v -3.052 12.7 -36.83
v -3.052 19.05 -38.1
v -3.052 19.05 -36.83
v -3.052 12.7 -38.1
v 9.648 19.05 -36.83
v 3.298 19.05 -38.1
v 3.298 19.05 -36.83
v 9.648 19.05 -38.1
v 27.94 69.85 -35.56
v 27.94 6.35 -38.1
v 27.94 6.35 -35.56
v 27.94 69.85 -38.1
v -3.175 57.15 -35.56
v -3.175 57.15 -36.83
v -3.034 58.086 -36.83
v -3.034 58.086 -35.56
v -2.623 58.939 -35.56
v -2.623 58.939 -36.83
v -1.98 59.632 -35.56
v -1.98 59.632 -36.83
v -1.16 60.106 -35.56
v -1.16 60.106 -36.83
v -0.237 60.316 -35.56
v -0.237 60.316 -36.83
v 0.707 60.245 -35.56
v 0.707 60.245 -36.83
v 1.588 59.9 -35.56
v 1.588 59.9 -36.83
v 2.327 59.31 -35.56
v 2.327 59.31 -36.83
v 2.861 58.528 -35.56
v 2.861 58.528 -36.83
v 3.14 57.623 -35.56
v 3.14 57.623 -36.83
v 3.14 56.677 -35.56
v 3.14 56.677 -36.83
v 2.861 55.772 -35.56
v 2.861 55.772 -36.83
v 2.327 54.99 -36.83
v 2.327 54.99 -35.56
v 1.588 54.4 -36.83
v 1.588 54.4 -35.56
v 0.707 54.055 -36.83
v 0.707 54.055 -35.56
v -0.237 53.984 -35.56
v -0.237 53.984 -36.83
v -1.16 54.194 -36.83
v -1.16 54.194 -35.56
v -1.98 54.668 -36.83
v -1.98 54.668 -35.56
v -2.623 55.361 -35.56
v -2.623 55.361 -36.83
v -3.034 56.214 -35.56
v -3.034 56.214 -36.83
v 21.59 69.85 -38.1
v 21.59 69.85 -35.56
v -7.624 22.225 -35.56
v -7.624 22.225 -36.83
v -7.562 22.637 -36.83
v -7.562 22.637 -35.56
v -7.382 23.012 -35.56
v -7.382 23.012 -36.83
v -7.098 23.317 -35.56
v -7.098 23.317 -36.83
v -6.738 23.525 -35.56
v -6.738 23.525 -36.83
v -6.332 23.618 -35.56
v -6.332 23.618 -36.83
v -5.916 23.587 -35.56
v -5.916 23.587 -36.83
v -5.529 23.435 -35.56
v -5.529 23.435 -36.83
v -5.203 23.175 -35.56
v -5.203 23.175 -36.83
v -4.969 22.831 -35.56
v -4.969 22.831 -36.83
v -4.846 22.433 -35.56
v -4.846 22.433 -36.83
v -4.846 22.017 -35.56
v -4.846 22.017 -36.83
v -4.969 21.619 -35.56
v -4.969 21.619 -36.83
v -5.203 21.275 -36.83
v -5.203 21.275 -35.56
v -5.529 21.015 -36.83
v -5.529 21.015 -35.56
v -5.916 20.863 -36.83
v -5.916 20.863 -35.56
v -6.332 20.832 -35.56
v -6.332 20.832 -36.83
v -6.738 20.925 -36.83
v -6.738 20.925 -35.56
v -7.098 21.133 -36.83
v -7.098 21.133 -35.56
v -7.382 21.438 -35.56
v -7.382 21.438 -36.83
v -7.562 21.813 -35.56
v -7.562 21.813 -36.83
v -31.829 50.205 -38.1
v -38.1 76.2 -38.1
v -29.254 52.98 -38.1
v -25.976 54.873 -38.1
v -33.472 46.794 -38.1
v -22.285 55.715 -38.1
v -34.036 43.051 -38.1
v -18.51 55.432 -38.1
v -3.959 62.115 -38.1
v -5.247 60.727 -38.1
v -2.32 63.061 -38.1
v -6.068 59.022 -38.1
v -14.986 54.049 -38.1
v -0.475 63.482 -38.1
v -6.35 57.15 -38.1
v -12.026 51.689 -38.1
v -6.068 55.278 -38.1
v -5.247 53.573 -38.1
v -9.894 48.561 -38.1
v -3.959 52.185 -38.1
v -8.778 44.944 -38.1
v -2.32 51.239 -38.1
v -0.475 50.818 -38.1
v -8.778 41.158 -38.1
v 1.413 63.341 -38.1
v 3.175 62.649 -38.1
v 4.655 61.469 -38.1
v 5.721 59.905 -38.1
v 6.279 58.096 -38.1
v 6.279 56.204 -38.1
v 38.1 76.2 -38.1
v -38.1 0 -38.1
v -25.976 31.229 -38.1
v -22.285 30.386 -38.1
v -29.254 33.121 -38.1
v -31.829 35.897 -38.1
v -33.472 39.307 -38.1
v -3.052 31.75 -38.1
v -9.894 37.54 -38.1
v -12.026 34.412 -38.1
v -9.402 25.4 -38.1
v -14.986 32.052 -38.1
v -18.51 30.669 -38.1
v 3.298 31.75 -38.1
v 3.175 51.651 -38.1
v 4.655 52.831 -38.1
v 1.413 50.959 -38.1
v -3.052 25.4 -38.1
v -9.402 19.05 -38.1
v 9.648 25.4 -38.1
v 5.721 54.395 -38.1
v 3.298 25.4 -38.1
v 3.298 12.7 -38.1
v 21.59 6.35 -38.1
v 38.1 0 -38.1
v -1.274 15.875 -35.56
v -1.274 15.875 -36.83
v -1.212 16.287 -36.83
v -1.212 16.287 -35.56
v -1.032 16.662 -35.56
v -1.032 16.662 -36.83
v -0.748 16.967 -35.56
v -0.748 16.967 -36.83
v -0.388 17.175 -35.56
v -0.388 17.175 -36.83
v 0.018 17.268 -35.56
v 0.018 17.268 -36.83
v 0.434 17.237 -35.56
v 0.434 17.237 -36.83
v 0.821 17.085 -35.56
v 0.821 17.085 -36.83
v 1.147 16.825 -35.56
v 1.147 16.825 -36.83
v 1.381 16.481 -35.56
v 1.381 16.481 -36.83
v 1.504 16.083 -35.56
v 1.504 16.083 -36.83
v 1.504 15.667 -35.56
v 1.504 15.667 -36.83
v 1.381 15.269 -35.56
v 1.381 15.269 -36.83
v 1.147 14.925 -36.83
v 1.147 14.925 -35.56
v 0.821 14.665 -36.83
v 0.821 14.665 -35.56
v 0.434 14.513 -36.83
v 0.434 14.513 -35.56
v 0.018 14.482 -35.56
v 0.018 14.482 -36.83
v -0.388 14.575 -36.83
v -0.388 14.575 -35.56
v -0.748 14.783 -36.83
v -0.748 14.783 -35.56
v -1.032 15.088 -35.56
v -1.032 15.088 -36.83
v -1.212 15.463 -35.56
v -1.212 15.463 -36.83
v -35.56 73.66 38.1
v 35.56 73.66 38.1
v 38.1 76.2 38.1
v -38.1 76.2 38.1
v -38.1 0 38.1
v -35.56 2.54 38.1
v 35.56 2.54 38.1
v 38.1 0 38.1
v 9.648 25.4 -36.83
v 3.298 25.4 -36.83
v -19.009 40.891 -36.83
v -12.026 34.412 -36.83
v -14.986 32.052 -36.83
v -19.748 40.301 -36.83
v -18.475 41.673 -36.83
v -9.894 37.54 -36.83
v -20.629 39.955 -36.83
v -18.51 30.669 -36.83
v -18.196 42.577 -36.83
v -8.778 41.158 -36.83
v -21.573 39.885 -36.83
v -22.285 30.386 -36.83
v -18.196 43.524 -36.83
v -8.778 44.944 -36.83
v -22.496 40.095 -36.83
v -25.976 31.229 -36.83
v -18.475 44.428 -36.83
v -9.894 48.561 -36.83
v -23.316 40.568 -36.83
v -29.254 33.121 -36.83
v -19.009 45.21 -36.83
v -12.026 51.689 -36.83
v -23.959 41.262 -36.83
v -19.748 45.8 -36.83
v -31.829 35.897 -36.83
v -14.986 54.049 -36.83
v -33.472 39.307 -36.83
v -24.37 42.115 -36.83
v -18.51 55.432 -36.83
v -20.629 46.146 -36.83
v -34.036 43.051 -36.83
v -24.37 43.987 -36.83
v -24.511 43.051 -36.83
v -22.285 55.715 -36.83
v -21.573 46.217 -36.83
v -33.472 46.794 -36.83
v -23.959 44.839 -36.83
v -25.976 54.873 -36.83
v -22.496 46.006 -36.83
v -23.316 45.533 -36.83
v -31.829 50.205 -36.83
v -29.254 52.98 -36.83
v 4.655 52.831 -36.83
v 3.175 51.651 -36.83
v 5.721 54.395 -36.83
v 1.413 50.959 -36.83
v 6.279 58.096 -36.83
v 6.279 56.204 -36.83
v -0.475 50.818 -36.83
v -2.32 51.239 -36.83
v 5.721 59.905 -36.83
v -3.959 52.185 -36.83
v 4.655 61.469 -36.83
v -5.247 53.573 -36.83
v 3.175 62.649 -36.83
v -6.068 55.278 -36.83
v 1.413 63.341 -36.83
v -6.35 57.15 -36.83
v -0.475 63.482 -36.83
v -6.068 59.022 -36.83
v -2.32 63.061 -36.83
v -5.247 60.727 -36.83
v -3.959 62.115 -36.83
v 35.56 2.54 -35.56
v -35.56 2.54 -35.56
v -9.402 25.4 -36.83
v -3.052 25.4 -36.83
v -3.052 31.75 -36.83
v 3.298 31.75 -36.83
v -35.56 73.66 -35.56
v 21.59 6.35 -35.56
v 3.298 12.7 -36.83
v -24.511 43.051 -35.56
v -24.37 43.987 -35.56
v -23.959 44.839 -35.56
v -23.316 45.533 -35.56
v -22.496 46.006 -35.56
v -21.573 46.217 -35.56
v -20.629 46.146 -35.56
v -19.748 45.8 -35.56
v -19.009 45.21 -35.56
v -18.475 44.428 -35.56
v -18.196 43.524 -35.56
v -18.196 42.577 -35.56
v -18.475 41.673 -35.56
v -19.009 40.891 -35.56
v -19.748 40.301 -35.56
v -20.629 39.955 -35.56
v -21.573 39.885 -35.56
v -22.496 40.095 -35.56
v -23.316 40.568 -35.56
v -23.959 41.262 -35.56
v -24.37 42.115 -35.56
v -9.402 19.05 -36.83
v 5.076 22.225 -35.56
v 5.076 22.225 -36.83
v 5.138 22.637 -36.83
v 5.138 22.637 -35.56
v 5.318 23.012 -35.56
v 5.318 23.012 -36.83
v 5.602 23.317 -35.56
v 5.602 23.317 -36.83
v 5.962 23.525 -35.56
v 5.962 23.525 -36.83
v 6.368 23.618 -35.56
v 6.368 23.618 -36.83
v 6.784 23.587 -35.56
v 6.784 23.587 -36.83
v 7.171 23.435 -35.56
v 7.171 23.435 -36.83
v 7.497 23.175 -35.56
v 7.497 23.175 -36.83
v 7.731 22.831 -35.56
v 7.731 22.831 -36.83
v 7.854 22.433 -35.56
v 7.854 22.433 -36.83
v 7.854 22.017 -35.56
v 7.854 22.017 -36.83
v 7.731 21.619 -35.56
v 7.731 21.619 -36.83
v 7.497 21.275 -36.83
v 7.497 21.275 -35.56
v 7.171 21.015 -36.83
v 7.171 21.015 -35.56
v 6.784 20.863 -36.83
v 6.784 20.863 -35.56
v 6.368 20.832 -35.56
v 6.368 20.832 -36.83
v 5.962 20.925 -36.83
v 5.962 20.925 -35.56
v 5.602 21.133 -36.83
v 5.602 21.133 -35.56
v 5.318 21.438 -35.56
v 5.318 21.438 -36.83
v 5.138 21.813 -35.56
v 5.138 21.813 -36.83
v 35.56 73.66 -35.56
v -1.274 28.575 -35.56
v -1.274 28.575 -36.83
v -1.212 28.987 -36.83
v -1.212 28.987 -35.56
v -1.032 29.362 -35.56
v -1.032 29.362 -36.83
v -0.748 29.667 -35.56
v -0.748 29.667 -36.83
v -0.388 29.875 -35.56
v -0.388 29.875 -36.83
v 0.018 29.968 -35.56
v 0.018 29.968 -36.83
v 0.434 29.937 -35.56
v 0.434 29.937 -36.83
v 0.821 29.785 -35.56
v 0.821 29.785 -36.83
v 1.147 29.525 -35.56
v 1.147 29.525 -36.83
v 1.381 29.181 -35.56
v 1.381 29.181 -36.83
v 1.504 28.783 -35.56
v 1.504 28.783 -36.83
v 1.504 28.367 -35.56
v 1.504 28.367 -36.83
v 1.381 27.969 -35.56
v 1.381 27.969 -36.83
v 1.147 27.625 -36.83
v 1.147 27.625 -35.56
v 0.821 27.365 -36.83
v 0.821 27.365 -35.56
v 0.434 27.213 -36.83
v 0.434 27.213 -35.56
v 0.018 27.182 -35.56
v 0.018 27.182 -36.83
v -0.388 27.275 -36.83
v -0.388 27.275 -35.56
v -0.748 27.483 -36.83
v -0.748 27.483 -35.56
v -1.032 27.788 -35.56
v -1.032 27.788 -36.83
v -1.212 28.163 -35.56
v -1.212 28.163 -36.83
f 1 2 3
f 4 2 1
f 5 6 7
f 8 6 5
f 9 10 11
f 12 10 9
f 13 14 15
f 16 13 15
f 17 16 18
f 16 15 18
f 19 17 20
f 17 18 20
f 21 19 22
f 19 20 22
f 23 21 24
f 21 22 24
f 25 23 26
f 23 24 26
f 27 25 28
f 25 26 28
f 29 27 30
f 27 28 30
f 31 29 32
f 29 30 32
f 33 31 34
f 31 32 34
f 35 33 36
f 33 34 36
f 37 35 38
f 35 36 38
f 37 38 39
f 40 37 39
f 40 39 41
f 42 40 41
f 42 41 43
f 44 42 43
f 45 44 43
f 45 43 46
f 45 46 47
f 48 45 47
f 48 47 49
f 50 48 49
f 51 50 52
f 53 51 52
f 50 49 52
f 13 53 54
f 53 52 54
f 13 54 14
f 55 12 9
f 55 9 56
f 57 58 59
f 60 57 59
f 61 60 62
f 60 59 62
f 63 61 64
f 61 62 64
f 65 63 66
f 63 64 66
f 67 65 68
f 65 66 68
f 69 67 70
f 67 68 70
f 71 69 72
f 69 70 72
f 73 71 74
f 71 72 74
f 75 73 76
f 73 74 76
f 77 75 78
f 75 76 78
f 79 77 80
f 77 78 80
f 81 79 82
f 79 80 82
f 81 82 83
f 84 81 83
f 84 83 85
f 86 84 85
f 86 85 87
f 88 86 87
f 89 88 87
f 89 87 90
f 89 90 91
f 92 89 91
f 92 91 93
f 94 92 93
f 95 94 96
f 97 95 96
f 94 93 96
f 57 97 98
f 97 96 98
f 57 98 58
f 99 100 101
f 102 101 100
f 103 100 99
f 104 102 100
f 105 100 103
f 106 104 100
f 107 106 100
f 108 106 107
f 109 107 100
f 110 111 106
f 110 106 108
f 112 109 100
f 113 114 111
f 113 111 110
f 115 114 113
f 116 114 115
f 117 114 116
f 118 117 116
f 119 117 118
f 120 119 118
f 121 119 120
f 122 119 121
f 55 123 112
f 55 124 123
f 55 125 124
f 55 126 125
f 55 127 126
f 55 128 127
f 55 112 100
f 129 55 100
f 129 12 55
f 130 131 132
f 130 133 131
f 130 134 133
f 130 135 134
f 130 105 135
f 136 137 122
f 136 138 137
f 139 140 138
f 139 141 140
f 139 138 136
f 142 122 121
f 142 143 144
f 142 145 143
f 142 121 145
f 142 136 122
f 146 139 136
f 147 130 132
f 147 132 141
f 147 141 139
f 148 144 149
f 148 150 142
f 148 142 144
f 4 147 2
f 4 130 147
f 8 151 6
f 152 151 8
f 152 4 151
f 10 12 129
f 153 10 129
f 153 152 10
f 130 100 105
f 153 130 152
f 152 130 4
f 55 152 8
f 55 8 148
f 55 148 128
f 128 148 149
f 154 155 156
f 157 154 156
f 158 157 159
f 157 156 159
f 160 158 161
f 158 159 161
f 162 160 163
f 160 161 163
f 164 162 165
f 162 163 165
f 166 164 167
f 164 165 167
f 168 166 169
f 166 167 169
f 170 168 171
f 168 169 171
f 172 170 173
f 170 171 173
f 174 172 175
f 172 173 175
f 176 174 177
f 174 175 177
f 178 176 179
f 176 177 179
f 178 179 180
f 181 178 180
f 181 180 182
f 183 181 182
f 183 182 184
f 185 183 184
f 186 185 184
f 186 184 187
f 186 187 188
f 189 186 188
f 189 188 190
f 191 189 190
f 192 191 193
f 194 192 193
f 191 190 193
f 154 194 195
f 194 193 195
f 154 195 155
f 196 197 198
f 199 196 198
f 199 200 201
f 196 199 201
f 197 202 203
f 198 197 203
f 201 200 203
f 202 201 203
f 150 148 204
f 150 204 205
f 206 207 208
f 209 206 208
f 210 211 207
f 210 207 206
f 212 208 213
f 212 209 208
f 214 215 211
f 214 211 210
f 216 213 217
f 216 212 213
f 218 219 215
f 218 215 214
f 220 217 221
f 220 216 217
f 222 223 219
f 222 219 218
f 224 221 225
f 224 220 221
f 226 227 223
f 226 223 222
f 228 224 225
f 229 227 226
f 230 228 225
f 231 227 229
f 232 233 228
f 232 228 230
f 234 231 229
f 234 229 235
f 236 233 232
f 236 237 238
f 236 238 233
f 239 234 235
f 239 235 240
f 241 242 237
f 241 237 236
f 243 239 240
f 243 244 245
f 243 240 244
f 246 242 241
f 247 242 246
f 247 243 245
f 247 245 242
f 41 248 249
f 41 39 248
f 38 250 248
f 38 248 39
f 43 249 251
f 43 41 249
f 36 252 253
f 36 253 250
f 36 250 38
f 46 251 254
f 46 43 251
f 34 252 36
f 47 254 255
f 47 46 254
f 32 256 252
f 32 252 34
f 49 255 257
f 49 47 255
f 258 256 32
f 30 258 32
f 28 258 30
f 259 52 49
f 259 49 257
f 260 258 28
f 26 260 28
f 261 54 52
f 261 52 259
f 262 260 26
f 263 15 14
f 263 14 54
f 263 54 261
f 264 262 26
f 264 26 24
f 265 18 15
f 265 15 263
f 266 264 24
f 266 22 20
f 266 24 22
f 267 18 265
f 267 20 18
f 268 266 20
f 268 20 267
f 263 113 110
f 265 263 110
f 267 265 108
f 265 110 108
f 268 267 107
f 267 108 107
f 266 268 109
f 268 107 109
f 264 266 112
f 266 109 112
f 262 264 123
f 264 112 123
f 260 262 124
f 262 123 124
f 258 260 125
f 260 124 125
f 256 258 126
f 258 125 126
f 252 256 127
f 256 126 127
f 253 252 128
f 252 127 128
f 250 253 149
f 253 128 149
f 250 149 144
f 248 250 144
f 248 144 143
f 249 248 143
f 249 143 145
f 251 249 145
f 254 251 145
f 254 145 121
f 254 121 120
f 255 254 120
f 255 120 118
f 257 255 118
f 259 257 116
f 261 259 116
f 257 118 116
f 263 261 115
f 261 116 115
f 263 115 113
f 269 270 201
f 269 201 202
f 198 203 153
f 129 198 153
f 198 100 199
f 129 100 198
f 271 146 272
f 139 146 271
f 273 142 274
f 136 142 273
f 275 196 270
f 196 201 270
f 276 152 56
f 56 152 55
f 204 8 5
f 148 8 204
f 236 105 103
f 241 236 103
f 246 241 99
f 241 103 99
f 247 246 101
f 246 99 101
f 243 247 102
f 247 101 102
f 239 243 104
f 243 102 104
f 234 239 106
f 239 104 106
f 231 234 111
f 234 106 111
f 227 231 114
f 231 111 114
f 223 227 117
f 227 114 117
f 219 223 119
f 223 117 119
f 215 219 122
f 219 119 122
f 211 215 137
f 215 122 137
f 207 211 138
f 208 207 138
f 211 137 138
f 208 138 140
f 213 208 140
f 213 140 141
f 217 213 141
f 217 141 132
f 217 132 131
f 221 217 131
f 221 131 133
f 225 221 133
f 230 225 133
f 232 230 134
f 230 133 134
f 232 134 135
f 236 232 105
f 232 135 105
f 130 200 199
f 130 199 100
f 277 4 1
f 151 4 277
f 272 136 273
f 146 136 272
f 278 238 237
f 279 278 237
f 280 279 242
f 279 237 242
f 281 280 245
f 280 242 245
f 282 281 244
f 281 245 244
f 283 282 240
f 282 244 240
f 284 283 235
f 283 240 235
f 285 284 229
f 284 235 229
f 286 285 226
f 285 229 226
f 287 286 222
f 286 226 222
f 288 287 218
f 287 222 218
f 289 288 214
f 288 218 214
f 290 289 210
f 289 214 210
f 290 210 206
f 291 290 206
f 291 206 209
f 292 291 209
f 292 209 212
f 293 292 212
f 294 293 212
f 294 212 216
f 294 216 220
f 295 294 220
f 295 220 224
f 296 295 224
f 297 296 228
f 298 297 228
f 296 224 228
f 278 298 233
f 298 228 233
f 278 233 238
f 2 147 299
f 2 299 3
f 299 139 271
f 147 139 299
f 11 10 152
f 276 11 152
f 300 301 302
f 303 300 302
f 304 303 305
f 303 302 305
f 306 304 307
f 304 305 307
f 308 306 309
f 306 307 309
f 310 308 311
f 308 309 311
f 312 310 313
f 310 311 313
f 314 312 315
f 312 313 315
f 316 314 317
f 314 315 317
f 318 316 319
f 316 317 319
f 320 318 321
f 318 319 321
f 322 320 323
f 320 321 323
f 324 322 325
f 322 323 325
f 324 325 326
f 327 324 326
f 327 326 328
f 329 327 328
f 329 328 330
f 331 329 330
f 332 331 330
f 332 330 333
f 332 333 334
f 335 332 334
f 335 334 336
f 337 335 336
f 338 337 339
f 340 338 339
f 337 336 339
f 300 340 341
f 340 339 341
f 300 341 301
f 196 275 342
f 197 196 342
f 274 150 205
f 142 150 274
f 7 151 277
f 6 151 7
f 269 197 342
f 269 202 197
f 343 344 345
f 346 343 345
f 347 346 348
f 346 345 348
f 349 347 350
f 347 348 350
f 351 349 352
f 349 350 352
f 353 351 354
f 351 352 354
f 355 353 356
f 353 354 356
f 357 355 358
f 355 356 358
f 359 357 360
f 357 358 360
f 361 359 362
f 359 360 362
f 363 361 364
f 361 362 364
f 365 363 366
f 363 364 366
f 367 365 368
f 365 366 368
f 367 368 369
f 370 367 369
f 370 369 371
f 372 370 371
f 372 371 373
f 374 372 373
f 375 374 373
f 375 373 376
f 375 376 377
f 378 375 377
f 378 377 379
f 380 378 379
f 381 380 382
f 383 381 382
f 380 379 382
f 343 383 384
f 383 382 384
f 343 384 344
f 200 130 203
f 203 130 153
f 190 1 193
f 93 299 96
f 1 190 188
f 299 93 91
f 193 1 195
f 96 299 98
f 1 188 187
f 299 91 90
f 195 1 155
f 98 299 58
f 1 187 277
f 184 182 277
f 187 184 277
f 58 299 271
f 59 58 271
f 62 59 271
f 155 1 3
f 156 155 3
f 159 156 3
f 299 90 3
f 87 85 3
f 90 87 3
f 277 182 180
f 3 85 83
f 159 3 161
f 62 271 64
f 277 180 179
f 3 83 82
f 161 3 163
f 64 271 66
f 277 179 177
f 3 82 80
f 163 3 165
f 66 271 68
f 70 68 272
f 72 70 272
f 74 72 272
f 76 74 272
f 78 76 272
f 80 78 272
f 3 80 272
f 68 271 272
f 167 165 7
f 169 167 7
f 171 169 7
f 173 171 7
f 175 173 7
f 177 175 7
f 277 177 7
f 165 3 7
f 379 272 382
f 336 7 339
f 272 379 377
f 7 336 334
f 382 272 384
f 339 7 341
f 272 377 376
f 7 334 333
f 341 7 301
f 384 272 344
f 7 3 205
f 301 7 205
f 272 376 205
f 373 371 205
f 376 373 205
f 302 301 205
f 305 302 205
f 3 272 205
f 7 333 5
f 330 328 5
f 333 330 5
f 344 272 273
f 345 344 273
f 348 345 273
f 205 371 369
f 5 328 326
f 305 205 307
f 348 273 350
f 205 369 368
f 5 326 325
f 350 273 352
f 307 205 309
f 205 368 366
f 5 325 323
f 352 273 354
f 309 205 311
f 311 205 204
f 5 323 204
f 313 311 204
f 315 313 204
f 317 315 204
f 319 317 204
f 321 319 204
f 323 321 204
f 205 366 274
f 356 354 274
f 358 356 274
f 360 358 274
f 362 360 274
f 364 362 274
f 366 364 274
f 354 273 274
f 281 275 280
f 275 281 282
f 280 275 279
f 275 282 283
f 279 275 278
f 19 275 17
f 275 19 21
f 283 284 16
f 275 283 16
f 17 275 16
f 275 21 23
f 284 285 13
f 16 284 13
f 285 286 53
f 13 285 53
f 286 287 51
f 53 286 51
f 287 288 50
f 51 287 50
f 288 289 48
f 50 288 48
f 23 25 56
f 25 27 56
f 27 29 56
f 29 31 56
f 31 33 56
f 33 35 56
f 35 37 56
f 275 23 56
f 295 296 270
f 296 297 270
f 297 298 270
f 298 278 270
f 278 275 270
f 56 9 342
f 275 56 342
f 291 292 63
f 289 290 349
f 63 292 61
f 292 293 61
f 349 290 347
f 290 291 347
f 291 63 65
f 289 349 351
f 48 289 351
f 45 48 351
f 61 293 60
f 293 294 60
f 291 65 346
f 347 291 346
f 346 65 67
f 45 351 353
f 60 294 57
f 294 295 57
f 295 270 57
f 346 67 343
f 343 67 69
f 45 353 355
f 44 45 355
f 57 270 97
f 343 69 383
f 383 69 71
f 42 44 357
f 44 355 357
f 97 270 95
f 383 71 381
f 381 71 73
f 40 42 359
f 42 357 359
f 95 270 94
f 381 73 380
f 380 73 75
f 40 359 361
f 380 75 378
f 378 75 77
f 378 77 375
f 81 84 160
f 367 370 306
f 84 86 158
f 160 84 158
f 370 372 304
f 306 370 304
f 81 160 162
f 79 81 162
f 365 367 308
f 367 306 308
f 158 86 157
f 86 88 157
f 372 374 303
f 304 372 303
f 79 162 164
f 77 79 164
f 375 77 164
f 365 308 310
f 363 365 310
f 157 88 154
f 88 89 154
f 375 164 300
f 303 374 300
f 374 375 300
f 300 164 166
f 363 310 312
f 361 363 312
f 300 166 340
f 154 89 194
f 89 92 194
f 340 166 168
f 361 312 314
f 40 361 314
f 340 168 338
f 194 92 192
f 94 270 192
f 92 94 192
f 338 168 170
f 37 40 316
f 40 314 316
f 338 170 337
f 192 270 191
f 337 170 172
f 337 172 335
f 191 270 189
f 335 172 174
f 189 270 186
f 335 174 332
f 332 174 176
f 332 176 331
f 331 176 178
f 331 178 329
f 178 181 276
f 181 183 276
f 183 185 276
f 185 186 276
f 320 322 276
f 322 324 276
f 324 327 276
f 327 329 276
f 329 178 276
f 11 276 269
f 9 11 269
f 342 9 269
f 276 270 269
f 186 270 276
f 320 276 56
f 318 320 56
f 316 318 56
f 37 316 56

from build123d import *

# Parameters (mm, degrees)
SKETCH1_W               = 76.2
SKETCH1_H               = 76.2
BOX_DEPTH               = 76.2
HOLLOW_IT_T             = -2.54
SKETCH2_W               = 6.35
SKETCH2_H               = 63.5
SLIDER_TRACK_DEPTH      = 2.54
SKETCH4_R               = 6.35
BUTTON_LARGE_RING_DEPTH = 1.27
SKETCH5_R               = 3.175
BUTTON_SMALL_HOLE_DEPTH = 1.27
DPAD_LARGE_SHAPE_DEPTH  = 1.27
SKETCH7_R               = 1.397
DPAD_TINY_HOLES_DEPTH   = 1.27
SKETCH8_R               = 12.7
DIAL_LARGE_RING_DEPTH   = 1.27
SKETCH9_R               = 3.175
DIAL_SMALL_HOLE_DEPTH   = 1.27


with BuildPart() as part:
    # Sketch1 → box (new body)
    with BuildSketch(Plane(origin=(0, 0, 0), x_dir=(1, 0, 0), z_dir=(0, 1, 0))):
        Rectangle(SKETCH1_W, SKETCH1_H)
    extrude(amount=BOX_DEPTH)

    # hollow it
    hollow_it_openings = [part.faces().sort_by_distance(p)[0] for p in [
        (0, 38.1, 38.1),
    ]]
    offset(amount=HOLLOW_IT_T, openings=hollow_it_openings, kind=Kind.INTERSECTION)

    # Sketch2 → slider track (cut)
    with BuildSketch(Plane(origin=(0, 0, -38.1), x_dir=(-1, 0, 0), z_dir=(0, 0, -1))):
        with Locations((-24.765, 38.1)):
            Rectangle(SKETCH2_W, SKETCH2_H)
    extrude(amount=-SLIDER_TRACK_DEPTH, mode=Mode.SUBTRACT)

    # Sketch4 → button large ring (cut)
    with BuildSketch(Plane(origin=(0, 0, -38.1), x_dir=(-1, 0, 0), z_dir=(0, 0, -1))):
        with Locations((0, 57.15)):
            Circle(SKETCH4_R)
    extrude(amount=-BUTTON_LARGE_RING_DEPTH, mode=Mode.SUBTRACT)

    # Sketch5 → button small hole (cut)
    with BuildSketch(Plane(origin=(0, 0, -36.83), x_dir=(-1, 0, 0), z_dir=(0, 0, -1))):
        with Locations((0, 57.15)):
            Circle(SKETCH5_R)
    extrude(amount=-BUTTON_SMALL_HOLE_DEPTH, mode=Mode.SUBTRACT)

    # Sketch6 → dpad large shape (cut)
    with BuildSketch(Plane(origin=(0, 0, -38.1), x_dir=(-1, 0, 0), z_dir=(0, 0, -1))):
        Polygon((-3.297705804, 25.4), (-3.297705804, 31.75), (3.052294196, 31.75), (3.052294196, 25.4), (9.402294196, 25.4), (9.402294196, 19.05), (3.052294196, 19.05), (3.052294196, 12.7), (-3.297705804, 12.7), (-3.297705804, 19.05), (-9.647705804, 19.05), (-9.647705804, 25.4), align=None)
    extrude(amount=-DPAD_LARGE_SHAPE_DEPTH, mode=Mode.SUBTRACT)

    # Sketch7 → dpad tiny holes (cut)
    with BuildSketch(Plane(origin=(0, 0, -36.83), x_dir=(-1, 0, 0), z_dir=(0, 0, -1))):
        with Locations((-0.122705804, 28.575)):
            Circle(SKETCH7_R)
        with Locations((6.227294196, 22.225)):
            Circle(SKETCH7_R)
        with Locations((-0.122705804, 15.875)):
            Circle(SKETCH7_R)
        with Locations((-6.472705804, 22.225)):
            Circle(SKETCH7_R)
    extrude(amount=-DPAD_TINY_HOLES_DEPTH, mode=Mode.SUBTRACT)

    # Sketch8 → dial large ring (cut)
    with BuildSketch(Plane(origin=(0, 0, -38.1), x_dir=(-1, 0, 0), z_dir=(0, 0, -1))):
        with Locations((21.336, 43.050678032)):
            Circle(SKETCH8_R)
    extrude(amount=-DIAL_LARGE_RING_DEPTH, mode=Mode.SUBTRACT)

    # Sketch9 → dial small hole (cut)
    with BuildSketch(Plane(origin=(0, 0, -36.83), x_dir=(-1, 0, 0), z_dir=(0, 0, -1))):
        with Locations((21.336, 43.050678032)):
            Circle(SKETCH9_R)
    extrude(amount=-DIAL_SMALL_HOLE_DEPTH, mode=Mode.SUBTRACT)


solid = part.part
